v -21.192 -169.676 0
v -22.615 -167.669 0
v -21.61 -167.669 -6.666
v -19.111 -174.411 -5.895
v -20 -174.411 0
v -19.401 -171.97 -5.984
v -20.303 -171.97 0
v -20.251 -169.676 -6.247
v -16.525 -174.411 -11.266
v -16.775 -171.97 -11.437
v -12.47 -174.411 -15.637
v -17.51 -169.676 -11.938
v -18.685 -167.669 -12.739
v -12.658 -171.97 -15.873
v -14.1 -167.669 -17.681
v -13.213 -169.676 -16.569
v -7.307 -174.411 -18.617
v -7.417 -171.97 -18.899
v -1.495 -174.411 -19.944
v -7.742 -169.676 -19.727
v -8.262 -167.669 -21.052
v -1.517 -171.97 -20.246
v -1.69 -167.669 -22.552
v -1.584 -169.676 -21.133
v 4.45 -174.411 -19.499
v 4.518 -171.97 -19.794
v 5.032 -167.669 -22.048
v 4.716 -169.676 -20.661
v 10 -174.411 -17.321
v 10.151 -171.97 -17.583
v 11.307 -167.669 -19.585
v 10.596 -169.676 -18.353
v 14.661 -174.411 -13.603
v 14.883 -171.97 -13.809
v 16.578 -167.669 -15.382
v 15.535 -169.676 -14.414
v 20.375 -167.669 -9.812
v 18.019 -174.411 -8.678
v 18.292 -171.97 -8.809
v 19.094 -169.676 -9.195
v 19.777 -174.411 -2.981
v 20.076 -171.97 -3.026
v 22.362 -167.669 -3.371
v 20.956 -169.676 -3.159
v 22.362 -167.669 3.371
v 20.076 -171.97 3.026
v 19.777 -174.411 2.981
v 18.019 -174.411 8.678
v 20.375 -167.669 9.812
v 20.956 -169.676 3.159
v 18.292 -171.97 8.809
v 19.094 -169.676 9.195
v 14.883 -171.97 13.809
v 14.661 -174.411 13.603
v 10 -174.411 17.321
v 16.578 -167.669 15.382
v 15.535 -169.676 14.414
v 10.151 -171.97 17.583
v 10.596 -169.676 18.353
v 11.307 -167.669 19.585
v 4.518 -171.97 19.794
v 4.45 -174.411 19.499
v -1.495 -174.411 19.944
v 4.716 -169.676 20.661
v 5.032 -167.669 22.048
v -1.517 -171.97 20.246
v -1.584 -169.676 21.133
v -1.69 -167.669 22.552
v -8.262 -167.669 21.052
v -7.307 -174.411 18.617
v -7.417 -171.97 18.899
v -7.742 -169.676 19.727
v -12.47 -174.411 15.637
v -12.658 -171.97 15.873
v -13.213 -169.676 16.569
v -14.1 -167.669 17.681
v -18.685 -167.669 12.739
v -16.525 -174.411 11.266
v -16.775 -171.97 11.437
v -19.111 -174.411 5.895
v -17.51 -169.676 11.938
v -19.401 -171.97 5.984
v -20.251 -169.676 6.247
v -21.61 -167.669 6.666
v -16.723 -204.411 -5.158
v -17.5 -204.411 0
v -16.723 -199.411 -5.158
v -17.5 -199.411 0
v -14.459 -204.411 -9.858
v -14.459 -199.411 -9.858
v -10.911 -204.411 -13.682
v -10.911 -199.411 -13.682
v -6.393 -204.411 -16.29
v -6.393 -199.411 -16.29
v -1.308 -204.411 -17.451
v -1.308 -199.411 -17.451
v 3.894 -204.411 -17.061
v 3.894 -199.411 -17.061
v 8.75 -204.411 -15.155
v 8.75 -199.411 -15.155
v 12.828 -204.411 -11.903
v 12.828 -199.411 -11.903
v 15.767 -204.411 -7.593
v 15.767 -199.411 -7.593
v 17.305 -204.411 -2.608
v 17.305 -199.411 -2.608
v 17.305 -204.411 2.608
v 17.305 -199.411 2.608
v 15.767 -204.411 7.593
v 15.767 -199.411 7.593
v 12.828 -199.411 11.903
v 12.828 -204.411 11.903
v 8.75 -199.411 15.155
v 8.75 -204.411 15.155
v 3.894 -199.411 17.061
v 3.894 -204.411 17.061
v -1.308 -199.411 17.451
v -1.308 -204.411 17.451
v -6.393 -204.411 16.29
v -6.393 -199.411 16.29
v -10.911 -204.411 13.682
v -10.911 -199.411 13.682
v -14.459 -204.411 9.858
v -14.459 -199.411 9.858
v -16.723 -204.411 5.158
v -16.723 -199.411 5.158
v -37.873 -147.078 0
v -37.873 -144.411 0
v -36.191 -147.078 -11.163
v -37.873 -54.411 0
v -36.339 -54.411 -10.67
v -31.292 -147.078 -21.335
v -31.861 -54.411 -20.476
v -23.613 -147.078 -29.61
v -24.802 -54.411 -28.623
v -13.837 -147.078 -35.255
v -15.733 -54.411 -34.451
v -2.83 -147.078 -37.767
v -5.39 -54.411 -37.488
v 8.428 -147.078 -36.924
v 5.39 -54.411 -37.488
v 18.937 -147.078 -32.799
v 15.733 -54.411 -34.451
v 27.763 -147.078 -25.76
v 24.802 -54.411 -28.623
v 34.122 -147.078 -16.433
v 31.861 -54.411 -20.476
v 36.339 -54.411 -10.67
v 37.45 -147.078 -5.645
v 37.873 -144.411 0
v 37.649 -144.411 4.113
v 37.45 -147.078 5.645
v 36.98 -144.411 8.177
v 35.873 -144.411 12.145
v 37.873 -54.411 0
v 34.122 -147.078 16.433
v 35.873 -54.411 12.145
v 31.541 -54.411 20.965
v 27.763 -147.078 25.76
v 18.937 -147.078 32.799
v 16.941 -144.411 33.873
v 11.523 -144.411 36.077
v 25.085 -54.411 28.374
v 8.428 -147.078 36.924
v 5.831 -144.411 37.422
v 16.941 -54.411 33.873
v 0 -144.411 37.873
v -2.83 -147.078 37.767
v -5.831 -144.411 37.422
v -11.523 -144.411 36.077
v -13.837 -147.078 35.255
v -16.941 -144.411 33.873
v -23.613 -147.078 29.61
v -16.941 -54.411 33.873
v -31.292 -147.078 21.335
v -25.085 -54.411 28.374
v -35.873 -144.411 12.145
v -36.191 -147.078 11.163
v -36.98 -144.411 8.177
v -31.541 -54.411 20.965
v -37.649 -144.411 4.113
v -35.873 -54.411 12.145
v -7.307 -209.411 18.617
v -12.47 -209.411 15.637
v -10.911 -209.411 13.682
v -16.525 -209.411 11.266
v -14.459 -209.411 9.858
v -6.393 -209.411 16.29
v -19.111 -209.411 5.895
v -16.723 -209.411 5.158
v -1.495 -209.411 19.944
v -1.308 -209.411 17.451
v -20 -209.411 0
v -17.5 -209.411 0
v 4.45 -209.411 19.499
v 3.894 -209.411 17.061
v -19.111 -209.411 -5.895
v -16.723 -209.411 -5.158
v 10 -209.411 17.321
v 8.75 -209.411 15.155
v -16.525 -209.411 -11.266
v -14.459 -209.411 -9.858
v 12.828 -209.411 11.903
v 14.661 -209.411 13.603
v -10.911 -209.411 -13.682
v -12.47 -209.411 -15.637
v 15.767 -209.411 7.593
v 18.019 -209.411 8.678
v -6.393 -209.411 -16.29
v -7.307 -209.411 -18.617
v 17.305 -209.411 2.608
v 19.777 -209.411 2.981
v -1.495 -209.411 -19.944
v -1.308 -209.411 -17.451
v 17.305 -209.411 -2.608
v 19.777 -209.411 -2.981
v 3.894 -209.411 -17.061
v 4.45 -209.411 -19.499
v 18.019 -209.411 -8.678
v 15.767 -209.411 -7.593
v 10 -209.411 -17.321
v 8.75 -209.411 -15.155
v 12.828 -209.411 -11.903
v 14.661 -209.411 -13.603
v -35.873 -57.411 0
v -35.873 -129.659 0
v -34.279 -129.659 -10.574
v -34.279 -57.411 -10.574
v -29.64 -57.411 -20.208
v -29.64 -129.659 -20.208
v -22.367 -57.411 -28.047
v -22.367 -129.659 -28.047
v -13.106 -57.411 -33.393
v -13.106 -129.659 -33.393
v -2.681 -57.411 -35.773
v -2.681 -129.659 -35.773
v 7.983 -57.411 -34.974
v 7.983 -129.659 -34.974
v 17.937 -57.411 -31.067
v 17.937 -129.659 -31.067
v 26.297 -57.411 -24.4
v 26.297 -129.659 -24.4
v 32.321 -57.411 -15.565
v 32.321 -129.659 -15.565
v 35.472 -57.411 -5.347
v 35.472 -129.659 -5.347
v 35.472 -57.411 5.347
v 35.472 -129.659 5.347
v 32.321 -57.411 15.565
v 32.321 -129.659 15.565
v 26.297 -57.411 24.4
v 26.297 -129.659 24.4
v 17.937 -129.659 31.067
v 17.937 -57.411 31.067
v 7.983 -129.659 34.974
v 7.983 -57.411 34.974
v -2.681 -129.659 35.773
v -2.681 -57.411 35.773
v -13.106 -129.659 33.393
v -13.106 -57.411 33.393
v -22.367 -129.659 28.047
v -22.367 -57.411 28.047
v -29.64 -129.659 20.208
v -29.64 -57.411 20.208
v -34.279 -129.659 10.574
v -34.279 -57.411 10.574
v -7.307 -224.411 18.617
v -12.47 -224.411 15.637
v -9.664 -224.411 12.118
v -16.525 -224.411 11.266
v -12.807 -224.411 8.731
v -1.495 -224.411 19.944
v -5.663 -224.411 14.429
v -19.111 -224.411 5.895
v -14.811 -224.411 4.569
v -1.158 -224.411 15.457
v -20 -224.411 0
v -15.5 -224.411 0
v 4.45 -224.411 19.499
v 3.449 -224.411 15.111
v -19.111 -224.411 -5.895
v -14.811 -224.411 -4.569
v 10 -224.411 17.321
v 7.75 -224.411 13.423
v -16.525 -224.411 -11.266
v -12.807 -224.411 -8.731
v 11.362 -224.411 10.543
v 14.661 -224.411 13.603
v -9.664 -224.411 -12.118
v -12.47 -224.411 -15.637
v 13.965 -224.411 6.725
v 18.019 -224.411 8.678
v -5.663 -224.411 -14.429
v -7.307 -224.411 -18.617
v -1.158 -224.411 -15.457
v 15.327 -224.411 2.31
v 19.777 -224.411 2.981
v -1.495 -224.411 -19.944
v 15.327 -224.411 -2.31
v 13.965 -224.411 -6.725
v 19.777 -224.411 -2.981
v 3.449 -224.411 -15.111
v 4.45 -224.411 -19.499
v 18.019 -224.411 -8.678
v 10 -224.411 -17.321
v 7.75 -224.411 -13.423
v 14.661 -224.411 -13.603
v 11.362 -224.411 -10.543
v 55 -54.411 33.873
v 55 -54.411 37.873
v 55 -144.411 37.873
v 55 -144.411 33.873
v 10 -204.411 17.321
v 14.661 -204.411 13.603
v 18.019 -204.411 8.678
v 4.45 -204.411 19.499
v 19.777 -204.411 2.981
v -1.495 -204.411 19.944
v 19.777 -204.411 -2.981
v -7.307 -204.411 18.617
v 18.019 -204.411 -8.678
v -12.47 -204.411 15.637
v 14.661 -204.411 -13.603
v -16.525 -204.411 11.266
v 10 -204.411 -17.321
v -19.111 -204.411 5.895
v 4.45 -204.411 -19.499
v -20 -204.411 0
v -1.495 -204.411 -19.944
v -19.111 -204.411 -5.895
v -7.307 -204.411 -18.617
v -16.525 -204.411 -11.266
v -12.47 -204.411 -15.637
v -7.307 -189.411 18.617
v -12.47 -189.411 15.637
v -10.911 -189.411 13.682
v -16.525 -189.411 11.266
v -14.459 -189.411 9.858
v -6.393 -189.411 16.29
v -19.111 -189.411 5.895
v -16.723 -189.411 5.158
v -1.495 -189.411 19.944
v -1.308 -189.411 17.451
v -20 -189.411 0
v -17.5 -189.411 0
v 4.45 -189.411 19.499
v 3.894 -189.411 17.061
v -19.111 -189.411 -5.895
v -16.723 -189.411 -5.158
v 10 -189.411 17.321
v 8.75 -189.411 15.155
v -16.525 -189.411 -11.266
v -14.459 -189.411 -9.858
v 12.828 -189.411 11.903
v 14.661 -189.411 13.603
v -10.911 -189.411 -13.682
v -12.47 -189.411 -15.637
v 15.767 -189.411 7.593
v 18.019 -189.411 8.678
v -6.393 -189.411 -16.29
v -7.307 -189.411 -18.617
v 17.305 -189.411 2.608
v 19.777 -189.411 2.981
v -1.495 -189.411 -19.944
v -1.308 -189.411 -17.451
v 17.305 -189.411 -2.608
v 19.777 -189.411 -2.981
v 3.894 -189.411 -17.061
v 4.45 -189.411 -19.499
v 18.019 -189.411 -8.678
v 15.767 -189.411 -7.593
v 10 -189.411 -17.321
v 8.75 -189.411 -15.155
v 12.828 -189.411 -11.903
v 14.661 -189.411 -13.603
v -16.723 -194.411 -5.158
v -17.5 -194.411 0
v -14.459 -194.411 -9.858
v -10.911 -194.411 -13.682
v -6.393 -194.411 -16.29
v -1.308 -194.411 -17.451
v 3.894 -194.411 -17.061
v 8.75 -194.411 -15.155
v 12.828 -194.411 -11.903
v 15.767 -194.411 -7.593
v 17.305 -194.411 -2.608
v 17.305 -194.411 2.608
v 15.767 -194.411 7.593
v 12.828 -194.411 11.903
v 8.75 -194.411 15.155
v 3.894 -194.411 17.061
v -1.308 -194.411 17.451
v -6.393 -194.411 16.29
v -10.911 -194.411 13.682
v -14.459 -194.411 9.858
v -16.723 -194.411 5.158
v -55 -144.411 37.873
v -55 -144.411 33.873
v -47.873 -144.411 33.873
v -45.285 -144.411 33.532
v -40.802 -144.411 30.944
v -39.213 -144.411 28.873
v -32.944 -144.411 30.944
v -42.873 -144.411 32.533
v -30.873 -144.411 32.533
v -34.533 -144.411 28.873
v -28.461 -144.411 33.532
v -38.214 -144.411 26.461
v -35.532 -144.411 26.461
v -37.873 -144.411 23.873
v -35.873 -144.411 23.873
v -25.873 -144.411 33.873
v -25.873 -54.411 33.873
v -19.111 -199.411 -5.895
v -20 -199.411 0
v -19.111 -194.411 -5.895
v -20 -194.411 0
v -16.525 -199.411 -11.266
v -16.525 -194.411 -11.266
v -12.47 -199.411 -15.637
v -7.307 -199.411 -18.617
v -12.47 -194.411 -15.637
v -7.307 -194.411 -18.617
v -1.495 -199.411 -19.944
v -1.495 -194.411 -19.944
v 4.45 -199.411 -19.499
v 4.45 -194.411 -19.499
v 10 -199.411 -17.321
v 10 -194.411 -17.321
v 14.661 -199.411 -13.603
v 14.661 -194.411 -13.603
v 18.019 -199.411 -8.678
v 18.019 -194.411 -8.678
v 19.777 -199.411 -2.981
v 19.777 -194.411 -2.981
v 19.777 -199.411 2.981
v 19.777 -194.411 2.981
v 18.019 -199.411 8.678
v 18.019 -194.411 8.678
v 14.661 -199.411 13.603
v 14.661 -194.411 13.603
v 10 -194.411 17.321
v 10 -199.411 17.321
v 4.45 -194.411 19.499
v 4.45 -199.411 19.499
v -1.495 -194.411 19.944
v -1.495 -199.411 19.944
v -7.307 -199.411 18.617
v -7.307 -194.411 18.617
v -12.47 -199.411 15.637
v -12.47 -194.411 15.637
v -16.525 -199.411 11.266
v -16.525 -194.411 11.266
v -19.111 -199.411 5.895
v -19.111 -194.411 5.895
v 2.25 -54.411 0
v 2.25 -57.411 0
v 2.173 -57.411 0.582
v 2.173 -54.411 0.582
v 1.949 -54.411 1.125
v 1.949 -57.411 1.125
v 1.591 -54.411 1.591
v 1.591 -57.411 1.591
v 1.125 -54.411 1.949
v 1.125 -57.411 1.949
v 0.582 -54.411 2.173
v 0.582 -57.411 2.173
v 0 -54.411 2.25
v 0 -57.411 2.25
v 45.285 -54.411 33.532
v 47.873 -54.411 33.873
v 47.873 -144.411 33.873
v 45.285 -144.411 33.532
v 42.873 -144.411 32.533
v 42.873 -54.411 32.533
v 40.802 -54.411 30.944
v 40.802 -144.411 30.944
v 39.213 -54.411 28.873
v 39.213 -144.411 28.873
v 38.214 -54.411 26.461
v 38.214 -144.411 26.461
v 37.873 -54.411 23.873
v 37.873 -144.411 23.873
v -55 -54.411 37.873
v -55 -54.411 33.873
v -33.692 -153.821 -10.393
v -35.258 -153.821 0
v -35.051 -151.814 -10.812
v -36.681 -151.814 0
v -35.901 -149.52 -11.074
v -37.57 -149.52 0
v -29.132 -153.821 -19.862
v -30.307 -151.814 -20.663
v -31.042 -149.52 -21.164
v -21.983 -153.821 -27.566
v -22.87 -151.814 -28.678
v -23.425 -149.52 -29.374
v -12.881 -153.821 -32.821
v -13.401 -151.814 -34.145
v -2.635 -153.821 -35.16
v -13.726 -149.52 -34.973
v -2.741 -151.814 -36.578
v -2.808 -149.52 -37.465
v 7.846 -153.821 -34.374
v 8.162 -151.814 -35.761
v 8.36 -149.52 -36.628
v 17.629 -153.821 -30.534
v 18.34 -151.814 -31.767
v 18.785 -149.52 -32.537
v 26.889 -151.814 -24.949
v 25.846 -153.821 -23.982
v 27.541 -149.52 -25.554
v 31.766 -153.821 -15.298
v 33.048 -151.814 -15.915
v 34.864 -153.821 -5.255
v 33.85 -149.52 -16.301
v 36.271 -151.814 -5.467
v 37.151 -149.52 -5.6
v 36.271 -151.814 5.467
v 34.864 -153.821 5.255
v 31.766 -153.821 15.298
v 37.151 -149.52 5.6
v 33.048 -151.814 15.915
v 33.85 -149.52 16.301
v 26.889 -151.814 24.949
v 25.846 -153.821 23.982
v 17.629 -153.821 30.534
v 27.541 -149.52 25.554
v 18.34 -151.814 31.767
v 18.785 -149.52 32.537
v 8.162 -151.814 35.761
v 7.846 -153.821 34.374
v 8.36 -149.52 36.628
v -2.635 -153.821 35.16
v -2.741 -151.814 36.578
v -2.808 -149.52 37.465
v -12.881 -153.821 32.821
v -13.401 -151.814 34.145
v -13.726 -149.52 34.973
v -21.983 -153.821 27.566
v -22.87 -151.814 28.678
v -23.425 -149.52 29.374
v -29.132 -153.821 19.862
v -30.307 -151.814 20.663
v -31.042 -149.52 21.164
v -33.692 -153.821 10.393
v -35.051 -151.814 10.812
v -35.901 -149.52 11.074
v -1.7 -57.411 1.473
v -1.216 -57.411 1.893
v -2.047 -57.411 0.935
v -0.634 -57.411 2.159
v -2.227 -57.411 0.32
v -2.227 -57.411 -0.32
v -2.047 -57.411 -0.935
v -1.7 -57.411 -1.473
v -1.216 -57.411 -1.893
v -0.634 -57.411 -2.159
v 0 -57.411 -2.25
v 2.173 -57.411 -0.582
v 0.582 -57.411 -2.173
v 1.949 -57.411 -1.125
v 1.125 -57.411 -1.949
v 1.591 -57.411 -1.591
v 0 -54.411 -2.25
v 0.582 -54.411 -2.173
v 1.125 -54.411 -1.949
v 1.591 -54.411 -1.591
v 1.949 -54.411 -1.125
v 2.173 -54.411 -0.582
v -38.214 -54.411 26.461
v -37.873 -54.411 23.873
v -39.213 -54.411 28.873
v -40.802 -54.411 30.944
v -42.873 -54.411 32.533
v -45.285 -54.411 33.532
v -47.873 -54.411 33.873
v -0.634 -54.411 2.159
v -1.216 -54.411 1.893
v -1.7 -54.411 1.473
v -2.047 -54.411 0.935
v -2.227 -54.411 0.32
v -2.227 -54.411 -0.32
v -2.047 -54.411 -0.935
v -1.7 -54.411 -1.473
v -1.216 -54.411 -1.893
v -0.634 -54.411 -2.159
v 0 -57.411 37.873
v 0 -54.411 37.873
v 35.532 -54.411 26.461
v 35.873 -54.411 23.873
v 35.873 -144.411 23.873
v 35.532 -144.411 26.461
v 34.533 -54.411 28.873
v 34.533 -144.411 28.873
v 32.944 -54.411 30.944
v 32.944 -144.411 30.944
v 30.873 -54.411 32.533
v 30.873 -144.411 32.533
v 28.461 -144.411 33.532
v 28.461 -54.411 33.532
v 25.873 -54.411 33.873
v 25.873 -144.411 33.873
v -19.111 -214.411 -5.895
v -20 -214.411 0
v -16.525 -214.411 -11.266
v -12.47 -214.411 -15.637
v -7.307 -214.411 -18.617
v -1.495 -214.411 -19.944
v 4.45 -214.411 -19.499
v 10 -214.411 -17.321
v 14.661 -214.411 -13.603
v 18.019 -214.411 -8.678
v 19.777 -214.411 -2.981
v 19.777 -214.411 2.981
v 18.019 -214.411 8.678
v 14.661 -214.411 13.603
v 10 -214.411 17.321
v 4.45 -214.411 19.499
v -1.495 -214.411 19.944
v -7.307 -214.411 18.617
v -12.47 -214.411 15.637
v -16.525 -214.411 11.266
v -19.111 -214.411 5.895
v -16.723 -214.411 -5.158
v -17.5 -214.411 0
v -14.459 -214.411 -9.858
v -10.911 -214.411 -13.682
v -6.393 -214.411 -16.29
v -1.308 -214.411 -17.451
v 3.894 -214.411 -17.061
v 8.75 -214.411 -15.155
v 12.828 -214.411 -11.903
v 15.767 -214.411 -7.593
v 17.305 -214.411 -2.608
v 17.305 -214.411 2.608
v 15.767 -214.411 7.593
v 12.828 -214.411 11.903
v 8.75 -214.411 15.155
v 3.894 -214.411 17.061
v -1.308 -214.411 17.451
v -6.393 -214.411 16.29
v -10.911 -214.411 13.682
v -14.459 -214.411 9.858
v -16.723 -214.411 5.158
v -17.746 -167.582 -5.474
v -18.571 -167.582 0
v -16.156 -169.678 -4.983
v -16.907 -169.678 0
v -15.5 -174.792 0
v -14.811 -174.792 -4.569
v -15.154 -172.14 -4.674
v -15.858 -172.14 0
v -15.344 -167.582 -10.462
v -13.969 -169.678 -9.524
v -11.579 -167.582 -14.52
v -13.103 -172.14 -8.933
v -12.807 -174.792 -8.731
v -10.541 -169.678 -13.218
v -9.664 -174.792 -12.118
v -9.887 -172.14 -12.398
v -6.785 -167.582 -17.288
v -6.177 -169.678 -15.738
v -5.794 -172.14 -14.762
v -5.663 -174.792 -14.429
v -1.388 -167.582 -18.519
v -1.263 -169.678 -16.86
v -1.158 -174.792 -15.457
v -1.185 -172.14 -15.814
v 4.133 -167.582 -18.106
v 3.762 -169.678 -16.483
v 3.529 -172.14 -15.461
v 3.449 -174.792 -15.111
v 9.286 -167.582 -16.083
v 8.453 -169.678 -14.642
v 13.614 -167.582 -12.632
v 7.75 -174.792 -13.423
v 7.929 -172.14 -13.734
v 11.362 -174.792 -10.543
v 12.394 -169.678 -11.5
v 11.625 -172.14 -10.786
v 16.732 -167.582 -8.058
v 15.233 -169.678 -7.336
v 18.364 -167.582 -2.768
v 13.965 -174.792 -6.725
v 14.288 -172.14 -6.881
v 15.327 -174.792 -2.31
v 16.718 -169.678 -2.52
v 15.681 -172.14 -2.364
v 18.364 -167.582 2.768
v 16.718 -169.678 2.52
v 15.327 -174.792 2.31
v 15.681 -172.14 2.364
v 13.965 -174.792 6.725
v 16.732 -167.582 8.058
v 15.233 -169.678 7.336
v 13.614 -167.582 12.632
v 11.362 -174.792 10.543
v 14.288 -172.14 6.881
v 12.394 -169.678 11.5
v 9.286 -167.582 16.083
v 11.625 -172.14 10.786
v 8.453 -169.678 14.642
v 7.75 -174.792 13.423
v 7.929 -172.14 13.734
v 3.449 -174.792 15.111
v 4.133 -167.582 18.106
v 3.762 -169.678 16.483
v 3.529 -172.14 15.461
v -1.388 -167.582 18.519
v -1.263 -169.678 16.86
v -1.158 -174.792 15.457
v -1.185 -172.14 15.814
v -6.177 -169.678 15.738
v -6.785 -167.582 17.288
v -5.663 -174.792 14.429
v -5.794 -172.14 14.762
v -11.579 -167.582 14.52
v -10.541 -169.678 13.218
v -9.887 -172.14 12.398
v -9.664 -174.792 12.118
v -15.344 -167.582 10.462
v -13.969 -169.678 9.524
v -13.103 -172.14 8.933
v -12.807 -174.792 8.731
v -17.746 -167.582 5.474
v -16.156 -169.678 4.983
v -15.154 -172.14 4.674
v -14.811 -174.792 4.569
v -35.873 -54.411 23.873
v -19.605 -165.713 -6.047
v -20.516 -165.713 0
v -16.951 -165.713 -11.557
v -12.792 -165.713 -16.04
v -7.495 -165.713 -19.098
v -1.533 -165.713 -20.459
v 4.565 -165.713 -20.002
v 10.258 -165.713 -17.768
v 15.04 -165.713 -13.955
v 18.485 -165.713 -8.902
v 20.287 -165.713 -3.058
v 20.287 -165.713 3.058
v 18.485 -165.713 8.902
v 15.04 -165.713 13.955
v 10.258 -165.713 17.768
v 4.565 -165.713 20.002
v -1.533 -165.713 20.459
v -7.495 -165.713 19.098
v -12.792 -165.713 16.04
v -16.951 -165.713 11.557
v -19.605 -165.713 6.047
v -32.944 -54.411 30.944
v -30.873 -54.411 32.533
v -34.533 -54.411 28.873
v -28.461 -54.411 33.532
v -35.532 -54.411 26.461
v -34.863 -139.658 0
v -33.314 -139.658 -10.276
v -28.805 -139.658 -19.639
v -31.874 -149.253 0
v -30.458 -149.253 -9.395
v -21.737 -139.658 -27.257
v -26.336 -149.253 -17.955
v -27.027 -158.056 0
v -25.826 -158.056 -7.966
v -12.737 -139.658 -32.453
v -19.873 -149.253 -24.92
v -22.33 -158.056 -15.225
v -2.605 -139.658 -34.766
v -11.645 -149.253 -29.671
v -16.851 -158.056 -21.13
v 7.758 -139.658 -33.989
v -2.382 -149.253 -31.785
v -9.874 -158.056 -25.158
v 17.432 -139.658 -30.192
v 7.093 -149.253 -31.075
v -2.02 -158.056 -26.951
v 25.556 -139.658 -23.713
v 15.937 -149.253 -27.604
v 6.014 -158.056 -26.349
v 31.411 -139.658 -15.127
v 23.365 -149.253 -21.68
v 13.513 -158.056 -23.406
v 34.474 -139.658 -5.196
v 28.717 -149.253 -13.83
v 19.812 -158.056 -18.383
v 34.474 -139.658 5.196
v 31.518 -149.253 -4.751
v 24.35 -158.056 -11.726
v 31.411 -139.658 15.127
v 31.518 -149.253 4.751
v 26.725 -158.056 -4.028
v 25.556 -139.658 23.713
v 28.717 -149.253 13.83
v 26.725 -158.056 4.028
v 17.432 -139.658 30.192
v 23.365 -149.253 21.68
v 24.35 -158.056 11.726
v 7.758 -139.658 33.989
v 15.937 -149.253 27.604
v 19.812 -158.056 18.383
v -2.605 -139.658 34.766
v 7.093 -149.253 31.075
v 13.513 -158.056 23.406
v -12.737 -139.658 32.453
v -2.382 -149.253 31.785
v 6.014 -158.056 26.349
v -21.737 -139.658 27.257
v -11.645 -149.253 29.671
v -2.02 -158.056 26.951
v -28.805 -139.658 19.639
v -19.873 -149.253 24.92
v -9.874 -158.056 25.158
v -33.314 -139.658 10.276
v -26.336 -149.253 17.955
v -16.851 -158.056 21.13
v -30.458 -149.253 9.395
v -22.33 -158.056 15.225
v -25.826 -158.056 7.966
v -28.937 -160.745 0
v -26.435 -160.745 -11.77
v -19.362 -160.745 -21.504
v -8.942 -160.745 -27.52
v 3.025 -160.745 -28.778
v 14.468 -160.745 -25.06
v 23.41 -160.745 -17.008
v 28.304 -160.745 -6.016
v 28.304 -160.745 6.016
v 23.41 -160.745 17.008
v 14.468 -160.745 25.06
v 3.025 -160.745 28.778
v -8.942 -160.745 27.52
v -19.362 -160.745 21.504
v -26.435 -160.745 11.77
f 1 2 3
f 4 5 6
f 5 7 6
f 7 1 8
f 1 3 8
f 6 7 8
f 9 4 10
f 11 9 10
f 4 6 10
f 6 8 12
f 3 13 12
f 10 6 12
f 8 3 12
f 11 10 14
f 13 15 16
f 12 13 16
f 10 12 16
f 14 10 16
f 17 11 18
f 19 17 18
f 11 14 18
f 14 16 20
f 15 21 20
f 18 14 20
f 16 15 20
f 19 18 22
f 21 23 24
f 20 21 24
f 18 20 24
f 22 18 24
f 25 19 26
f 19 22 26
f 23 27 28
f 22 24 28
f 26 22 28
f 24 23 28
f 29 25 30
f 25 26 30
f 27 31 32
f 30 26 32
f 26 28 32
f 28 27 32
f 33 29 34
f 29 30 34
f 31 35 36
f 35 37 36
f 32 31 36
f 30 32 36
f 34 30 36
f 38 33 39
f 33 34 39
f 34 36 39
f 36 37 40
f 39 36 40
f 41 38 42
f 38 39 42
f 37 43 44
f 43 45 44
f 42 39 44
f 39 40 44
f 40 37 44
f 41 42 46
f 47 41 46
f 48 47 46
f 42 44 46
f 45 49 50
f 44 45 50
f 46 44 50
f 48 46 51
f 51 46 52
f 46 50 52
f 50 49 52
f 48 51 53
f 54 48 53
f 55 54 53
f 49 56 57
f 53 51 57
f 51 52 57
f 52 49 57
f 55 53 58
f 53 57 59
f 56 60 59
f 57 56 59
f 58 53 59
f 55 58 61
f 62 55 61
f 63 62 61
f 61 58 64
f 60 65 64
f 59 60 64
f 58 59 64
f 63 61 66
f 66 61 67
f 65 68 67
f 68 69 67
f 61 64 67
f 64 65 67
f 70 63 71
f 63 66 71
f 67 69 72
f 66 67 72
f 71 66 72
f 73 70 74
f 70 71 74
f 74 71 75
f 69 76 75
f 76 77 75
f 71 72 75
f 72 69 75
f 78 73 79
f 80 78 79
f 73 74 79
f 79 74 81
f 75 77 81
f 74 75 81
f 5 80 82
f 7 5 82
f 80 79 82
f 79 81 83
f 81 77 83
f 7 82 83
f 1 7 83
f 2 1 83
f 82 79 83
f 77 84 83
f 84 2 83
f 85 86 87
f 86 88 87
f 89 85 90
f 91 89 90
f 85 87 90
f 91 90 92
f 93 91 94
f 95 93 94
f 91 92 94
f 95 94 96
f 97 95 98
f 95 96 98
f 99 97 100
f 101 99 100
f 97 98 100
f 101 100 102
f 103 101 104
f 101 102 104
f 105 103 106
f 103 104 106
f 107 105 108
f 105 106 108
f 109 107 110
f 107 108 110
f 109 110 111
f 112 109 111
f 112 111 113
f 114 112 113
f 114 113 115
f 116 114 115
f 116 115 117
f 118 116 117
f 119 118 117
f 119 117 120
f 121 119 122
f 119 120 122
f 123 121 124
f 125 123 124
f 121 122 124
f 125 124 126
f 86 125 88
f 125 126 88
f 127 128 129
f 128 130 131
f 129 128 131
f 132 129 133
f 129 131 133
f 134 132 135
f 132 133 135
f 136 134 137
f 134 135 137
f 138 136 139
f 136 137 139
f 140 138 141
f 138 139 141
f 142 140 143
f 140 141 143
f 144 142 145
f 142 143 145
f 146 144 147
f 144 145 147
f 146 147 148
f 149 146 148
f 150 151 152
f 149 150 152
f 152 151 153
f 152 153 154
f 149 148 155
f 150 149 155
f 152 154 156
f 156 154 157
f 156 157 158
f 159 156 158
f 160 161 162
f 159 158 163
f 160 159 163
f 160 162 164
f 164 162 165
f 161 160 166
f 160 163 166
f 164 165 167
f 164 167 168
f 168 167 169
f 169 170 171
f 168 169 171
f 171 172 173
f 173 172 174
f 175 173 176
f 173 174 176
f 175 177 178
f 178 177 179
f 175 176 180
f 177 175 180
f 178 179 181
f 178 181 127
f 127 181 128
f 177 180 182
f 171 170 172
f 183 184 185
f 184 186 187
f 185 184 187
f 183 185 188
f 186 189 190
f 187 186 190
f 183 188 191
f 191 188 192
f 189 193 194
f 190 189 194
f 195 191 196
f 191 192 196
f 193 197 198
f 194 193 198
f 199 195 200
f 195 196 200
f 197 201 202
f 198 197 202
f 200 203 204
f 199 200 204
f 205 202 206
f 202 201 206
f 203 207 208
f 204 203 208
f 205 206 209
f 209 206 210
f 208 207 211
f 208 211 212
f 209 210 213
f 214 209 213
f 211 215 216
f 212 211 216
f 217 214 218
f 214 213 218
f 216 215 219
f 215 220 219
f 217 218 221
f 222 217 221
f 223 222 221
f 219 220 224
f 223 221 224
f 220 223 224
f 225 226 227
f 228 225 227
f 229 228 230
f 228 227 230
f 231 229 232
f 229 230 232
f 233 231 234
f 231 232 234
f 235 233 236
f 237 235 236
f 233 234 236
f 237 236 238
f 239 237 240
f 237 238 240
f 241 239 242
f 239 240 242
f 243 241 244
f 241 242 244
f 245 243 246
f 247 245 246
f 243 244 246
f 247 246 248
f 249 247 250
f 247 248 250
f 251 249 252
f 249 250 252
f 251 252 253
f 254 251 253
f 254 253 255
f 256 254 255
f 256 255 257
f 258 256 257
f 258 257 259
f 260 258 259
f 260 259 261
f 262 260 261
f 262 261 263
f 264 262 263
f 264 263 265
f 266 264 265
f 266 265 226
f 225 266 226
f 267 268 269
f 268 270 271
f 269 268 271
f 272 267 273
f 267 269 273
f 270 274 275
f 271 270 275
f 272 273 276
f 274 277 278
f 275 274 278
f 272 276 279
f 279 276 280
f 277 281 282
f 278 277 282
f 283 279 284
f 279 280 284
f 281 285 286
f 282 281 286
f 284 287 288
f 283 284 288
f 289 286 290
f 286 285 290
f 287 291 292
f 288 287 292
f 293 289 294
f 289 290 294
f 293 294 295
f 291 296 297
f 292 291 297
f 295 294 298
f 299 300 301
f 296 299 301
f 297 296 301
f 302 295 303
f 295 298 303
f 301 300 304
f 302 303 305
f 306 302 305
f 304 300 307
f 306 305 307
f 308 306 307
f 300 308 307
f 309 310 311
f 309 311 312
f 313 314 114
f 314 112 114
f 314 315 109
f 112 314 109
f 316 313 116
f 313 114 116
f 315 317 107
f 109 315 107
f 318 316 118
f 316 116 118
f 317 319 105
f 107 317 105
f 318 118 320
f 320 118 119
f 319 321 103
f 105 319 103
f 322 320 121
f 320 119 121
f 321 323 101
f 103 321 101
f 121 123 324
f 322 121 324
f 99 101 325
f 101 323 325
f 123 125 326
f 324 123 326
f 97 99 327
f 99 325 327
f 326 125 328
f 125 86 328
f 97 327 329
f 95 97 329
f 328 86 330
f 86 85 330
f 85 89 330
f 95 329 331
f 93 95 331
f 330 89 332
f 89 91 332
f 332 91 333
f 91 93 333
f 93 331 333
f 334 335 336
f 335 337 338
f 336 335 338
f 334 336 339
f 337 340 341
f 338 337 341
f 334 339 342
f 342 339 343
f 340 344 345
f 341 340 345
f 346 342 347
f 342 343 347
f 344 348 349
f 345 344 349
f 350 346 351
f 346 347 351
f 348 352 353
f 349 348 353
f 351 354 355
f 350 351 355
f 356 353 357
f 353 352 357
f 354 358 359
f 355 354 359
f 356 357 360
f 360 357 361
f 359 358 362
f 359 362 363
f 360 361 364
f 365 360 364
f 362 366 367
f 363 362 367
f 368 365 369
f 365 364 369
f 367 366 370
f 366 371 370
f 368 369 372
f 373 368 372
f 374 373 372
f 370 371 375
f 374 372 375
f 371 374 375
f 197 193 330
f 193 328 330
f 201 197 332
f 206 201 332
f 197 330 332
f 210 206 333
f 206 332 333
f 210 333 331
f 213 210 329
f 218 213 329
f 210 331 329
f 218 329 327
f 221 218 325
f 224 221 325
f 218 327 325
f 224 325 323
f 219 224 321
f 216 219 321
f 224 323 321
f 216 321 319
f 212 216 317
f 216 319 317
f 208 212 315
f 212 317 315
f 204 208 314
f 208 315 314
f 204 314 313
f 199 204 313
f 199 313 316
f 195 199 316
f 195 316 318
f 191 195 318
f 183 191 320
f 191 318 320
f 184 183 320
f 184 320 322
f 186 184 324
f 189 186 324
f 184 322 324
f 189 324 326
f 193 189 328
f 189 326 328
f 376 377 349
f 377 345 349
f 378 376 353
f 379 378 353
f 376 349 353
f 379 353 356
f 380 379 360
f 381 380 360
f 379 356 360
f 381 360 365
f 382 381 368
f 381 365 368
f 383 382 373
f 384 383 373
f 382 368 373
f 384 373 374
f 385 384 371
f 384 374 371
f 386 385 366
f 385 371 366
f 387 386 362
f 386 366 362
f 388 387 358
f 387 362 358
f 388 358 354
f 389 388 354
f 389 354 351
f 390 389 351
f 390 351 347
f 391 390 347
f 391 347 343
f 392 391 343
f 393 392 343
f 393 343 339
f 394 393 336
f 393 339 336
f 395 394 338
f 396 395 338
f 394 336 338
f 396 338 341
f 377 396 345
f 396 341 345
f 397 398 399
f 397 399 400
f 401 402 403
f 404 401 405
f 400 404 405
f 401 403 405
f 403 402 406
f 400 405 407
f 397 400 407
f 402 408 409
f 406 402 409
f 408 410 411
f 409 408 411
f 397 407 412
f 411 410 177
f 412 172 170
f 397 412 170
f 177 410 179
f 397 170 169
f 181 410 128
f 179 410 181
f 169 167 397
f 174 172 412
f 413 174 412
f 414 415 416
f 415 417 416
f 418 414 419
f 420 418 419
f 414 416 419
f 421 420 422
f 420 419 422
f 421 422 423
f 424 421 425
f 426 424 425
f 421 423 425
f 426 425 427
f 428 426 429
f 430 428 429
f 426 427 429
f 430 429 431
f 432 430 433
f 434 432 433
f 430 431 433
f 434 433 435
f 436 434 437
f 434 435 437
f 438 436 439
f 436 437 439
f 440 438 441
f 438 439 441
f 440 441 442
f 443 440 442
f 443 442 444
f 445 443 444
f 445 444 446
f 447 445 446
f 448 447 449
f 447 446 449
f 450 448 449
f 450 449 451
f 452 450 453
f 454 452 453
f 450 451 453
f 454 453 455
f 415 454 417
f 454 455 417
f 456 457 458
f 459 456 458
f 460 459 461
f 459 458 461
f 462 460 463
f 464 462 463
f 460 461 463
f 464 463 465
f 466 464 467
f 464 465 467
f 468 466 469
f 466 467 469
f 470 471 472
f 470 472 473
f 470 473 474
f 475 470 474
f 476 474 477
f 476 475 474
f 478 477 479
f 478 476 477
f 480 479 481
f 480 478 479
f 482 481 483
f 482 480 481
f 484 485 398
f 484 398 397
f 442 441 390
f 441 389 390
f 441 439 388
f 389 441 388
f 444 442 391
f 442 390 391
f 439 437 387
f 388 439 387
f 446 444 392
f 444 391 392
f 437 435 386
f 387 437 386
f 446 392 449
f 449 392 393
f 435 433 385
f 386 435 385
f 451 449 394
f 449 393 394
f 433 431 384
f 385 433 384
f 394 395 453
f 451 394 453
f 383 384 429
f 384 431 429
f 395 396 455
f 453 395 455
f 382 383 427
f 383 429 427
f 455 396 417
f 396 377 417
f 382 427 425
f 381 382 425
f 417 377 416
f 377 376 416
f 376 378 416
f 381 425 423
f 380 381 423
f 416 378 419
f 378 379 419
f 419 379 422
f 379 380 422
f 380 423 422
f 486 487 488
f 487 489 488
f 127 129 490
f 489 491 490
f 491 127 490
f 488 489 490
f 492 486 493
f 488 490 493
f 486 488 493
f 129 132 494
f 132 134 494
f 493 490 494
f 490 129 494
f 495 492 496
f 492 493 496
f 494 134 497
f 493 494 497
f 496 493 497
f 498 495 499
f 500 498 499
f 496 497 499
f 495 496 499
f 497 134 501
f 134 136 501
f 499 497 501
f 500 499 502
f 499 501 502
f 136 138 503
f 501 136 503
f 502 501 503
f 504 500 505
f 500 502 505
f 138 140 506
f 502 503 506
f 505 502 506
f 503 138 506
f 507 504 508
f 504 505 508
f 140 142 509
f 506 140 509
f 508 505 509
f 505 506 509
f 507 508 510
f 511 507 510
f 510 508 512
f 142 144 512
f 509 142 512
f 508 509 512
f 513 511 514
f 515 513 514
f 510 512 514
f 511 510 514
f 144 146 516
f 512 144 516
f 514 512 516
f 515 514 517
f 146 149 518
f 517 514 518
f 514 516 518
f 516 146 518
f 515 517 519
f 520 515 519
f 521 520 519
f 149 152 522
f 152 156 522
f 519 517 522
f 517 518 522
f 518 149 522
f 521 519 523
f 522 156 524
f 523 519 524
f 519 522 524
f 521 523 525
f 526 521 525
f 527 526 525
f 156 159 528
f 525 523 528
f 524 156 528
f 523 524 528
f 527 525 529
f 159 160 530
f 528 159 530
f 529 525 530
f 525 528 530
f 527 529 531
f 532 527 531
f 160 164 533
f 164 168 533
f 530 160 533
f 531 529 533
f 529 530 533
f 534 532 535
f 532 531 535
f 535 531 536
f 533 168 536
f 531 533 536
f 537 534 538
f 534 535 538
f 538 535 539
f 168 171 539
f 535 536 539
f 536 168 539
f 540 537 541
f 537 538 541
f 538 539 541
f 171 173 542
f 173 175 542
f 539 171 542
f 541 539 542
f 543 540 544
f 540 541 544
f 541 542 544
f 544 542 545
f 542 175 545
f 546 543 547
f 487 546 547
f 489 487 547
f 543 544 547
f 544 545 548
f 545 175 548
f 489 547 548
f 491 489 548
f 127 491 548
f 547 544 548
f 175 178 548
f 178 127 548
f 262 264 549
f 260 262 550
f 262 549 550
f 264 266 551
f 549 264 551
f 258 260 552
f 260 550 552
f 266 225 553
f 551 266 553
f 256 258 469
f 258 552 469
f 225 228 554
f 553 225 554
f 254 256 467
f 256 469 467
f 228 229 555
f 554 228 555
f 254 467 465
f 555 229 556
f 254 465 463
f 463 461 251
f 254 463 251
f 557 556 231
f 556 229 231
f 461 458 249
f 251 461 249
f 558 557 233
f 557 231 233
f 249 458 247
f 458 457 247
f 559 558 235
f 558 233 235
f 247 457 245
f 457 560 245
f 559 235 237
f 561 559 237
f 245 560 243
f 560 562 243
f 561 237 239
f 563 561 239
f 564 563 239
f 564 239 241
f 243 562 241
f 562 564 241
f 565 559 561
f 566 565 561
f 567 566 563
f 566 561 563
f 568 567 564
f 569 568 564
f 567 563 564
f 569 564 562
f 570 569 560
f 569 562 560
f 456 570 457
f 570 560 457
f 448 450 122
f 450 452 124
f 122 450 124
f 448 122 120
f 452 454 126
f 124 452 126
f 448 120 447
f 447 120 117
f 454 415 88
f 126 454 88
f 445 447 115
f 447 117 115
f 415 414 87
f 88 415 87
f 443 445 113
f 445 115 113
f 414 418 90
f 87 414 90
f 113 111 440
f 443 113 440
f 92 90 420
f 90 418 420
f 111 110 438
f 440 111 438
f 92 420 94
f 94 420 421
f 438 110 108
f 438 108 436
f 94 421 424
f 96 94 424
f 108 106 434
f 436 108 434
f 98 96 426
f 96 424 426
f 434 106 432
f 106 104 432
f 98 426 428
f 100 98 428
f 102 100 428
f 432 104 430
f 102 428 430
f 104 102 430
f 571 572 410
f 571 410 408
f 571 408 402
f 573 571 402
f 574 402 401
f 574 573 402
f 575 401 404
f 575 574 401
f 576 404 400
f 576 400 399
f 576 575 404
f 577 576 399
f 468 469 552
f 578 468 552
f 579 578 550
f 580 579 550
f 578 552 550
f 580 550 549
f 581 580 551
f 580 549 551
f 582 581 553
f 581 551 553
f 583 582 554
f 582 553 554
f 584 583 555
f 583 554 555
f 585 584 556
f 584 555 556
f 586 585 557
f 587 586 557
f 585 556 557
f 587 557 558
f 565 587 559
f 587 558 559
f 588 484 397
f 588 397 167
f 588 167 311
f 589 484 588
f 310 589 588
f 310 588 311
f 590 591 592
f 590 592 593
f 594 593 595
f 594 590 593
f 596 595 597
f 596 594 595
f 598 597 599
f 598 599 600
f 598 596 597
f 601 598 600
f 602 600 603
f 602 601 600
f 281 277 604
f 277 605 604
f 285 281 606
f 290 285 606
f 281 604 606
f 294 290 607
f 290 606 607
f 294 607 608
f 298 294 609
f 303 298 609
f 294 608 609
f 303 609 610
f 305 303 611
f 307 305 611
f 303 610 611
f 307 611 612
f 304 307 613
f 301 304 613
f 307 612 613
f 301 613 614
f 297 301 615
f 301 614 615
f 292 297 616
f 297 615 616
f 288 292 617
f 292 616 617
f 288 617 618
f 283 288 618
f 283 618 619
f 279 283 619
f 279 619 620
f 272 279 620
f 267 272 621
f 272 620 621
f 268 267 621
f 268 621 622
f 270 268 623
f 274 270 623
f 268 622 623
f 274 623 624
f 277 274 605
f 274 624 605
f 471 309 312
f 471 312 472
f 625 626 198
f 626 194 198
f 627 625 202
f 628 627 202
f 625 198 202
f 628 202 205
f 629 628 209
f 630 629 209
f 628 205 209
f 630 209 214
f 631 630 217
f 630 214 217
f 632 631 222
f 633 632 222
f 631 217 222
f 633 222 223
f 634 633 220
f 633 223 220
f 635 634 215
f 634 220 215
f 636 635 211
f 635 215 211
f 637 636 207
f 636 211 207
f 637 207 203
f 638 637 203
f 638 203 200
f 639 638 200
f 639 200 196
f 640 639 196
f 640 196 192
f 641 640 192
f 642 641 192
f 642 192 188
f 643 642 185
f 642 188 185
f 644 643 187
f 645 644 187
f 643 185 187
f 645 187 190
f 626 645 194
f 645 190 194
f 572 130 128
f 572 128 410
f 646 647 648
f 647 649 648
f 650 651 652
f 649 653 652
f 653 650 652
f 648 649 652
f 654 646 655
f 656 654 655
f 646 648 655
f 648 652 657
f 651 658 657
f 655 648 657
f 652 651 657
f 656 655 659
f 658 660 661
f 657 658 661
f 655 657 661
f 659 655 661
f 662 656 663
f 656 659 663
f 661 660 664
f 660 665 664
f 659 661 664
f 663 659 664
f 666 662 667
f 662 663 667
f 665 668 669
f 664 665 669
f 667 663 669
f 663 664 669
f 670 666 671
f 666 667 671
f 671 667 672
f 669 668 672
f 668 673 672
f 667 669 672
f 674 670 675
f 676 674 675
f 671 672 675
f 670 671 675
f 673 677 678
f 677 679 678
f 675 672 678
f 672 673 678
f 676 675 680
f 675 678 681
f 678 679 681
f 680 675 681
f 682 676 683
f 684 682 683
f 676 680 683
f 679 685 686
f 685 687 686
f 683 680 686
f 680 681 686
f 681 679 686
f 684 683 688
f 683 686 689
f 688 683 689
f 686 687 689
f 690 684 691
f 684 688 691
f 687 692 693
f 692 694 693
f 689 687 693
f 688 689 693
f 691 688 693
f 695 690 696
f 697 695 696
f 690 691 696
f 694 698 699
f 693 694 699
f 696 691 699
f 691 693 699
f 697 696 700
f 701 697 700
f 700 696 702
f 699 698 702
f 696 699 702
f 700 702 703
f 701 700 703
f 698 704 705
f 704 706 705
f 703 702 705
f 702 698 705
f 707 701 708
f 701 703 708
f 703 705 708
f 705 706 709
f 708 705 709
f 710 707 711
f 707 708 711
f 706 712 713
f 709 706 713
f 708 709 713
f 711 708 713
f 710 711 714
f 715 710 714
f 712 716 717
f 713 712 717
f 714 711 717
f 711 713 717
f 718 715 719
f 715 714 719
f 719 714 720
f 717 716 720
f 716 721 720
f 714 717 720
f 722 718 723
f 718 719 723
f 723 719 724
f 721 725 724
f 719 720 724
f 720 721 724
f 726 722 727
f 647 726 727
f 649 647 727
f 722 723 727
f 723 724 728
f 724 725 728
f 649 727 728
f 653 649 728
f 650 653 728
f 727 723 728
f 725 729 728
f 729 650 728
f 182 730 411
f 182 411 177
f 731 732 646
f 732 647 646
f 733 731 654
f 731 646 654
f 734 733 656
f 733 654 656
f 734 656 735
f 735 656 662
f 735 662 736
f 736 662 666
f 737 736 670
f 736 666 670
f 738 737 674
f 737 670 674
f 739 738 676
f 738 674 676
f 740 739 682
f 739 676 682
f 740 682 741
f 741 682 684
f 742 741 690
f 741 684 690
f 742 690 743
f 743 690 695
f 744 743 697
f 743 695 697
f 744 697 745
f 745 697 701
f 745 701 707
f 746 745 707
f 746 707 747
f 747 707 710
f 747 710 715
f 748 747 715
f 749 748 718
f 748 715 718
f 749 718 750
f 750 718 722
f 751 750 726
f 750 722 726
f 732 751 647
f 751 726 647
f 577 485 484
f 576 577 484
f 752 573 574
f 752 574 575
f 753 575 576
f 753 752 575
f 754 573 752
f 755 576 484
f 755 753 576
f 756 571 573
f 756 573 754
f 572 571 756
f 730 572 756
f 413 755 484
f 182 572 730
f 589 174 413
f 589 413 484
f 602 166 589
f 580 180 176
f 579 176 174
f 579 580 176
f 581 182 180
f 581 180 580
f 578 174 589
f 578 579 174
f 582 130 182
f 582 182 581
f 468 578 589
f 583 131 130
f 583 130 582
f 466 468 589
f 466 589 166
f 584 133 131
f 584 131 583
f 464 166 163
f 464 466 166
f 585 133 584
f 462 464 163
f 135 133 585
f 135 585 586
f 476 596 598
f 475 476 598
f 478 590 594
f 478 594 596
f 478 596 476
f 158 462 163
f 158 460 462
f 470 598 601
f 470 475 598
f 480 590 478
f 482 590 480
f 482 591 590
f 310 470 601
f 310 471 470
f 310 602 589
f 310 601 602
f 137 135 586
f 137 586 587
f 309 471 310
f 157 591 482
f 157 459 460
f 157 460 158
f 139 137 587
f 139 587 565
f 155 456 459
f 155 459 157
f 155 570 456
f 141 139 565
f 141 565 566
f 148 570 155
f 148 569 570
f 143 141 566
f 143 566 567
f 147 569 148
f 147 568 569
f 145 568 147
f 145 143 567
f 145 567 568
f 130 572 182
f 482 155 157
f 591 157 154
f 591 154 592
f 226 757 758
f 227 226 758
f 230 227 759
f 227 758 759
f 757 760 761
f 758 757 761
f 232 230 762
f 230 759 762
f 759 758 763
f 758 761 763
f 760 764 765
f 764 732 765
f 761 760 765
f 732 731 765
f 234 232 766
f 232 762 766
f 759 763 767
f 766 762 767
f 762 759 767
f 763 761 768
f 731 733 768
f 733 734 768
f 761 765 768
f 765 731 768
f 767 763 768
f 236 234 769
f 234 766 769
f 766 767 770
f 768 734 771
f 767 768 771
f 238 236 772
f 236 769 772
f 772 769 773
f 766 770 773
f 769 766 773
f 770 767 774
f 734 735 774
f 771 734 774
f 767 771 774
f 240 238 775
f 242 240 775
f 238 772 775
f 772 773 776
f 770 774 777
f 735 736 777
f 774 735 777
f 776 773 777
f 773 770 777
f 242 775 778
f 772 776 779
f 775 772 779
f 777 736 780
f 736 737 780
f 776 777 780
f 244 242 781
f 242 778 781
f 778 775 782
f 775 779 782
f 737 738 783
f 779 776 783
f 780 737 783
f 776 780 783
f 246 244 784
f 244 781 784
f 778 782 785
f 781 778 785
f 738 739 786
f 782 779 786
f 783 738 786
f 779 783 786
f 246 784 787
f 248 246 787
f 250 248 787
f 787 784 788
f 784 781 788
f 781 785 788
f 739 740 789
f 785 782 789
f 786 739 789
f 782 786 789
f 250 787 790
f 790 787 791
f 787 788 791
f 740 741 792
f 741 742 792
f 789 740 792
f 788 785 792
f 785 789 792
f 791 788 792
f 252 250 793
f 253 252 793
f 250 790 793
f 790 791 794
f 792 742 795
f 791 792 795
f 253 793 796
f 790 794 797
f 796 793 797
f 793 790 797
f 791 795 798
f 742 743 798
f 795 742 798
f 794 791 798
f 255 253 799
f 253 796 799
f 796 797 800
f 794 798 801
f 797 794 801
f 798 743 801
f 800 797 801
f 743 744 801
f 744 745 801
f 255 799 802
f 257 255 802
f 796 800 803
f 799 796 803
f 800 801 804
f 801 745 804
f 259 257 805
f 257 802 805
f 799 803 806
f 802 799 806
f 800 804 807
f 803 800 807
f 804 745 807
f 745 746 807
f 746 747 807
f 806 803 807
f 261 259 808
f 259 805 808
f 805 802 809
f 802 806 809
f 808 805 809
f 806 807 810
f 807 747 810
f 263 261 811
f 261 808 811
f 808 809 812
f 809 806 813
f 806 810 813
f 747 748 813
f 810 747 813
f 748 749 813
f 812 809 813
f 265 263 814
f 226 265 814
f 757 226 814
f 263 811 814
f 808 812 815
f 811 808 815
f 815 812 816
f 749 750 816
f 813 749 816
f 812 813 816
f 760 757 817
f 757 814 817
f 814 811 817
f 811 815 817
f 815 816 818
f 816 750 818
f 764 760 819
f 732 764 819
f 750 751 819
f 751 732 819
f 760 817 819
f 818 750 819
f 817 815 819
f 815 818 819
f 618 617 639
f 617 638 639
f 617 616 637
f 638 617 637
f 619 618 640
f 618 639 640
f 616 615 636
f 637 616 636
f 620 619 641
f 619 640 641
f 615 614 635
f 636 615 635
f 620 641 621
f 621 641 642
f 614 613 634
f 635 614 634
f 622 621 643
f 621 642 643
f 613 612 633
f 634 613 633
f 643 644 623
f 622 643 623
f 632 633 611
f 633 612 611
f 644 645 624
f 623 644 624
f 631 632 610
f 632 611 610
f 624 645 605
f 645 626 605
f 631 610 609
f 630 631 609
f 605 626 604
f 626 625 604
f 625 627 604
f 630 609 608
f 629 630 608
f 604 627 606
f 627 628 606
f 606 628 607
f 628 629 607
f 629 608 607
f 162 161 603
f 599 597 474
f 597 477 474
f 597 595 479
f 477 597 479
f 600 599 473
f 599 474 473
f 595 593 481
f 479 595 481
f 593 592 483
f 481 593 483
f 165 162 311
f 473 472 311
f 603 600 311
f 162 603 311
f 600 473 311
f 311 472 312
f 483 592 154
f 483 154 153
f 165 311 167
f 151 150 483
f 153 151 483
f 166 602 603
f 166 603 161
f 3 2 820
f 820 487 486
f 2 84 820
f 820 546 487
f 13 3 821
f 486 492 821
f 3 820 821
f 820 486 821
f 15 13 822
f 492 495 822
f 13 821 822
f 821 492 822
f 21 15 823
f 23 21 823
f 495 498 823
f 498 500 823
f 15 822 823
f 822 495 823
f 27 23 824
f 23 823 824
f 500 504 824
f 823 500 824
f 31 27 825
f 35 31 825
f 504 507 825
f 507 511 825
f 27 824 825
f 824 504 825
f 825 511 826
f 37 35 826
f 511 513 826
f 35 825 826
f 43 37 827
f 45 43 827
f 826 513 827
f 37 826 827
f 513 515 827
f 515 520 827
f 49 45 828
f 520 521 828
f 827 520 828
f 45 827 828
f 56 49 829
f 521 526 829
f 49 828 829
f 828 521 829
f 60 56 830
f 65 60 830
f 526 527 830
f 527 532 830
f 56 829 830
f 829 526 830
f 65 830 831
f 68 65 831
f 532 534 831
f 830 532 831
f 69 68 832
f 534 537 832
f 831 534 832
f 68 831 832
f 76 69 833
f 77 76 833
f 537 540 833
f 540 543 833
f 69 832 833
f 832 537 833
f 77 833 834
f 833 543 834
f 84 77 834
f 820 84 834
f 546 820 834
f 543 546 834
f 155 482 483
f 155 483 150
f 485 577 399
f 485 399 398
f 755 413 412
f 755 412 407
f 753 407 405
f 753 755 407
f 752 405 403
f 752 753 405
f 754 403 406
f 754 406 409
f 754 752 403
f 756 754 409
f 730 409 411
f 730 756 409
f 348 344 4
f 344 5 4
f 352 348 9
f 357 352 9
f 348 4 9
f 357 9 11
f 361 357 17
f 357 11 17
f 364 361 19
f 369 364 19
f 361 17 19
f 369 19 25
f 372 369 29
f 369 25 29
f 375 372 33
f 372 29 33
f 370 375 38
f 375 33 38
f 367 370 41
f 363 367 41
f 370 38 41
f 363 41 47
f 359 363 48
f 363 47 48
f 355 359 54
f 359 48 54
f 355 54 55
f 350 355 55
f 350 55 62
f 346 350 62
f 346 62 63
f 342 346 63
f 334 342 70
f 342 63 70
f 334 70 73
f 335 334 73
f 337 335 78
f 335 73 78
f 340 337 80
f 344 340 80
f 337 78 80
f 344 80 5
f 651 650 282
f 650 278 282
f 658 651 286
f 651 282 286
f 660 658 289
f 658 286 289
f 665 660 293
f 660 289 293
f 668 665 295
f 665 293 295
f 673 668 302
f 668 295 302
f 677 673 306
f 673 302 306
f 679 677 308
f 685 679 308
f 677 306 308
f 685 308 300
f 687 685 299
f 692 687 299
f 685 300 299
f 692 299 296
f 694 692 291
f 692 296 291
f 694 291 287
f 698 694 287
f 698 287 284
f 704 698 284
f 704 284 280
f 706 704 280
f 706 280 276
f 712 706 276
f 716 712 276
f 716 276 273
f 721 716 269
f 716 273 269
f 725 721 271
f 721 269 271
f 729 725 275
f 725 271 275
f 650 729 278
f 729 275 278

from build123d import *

# Parameters (mm, degrees)
EXTRUDE_1_DEPTH = 90
EXTRUDE_START   = -3
EXTRUDE_2_DEPTH = 3


with BuildPart() as part:
    # 草图2 → 旋转1 (revolve)
    with BuildSketch(Plane.XY, mode=Mode.PRIVATE) as revolve_1_sk:
        with BuildLine():
            Line((20, -224.411230387), (20, -214.411230387))
            Line((20, -214.411230387), (17.5, -214.411230387))
            Line((17.5, -214.411230387), (17.5, -209.411230387))
            Line((17.5, -209.411230387), (20, -209.411230387))
            Line((20, -209.411230387), (20, -204.411230387))
            Line((20, -204.411230387), (17.5, -204.411230387))
            Line((17.5, -204.411230387), (17.5, -199.411230387))
            Line((17.5, -199.411230387), (20, -199.411230387))
            Line((20, -199.411230387), (20, -194.411230387))
            Line((20, -194.411230387), (17.5, -194.411230387))
            Line((17.5, -194.411230387), (17.5, -189.411230387))
            Line((17.5, -189.411230387), (20, -189.411230387))
            Line((20, -189.411230387), (20, -174.411230387))
            ThreePointArc((20, -174.411230387), (20.676631798, -170.795320354), (22.614961073, -167.668738262))
            Line((22.614961073, -167.668738262), (35.258140309, -153.820687856))
            ThreePointArc((35.258140309, -153.820687856), (37.196469585, -150.694105764), (37.873101383, -147.078195731))
            Line((37.873101383, -147.078195731), (37.873101383, -54.411230387))
            Line((37.873101383, -54.411230387), (35.873101383, -54.411230387))
            Line((35.873101383, -54.411230387), (35.873101383, -129.659355933))
            ThreePointArc((35.873101383, -129.659355933), (31.874010536, -149.253139566), (20.5164471, -165.712630368))
            Line((20.5164471, -165.712630368), (18.571330856, -167.581679311))
            ThreePointArc((18.571330856, -167.581679311), (16.299818169, -170.873577472), (15.5, -174.792334198))
            Line((15.5, -174.792334198), (15.5, -224.411230387))
            Line((15.5, -224.411230387), (20, -224.411230387))
        make_face()
    revolve(revolve_1_sk.sketch.rotate(Axis((0, -59.896764436, 0), (0, -1, 0)), 180), axis=Axis((0, -59.896764436, 0), (0, -1, 0)))

    # 草图4 → 凸台-拉伸1 (add)
    with BuildSketch(Plane(origin=(0, -54.411230387, 0), x_dir=(1, 0, 0), z_dir=(0, 1, 0))):
        with BuildLine():
            ThreePointArc((-35.873101383, -12.144645138), (-37.369756581, -6.154112558), (-37.873101383, 0))
            Line((-37.873101383, 0), (-37.873101383, -23.873101383))
            ThreePointArc((-37.873101383, -23.873101383), (-40.802033571, -30.944169195), (-47.873101383, -33.873101383))
            Line((-47.873101383, -33.873101383), (-55, -33.873101383))
            Line((-55, -33.873101383), (-55, -37.873101383))
            Line((-55, -37.873101383), (0, -37.873101383))
            ThreePointArc((0, -37.873101383), (-8.703229445, -36.859538868), (-16.940626053, -33.873101383))
            Line((-16.940626053, -33.873101383), (-25.873101383, -33.873101383))
            ThreePointArc((-25.873101383, -33.873101383), (-32.944169195, -30.944169195), (-35.873101383, -23.873101383))
            Line((-35.873101383, -23.873101383), (-35.873101383, -12.144645138))
        make_face()
        with BuildLine():
            Line((37.873101383, -23.873101383), (37.873101383, 0))
            ThreePointArc((37.873101383, 0), (37.369756581, -6.154112558), (35.873101383, -12.144645138))
            Line((35.873101383, -12.144645138), (35.873101383, -23.873101383))
            ThreePointArc((35.873101383, -23.873101383), (32.944169195, -30.944169195), (25.873101383, -33.873101383))
            Line((25.873101383, -33.873101383), (16.940626053, -33.873101383))
            ThreePointArc((16.940626053, -33.873101383), (8.703229445, -36.859538868), (0, -37.873101383))
            Line((0, -37.873101383), (55, -37.873101383))
            Line((55, -37.873101383), (55, -33.873101383))
            Line((55, -33.873101383), (47.873101383, -33.873101383))
            ThreePointArc((47.873101383, -33.873101383), (40.802033571, -30.944169195), (37.873101383, -23.873101383))
        make_face()
        with BuildLine():
            ThreePointArc((0, -35.873101383), (-5.98941578, -35.369567448), (-11.810690307, -33.873101383))
            Line((-11.810690307, -33.873101383), (-16.940626053, -33.873101383))
            ThreePointArc((-16.940626053, -33.873101383), (-8.703229445, -36.859538868), (0, -37.873101383))
            Line((0, -37.873101383), (0, -35.873101383))
        make_face()
        with BuildLine():
            Line((16.940626053, -33.873101383), (11.810690307, -33.873101383))
            ThreePointArc((11.810690307, -33.873101383), (5.98941578, -35.369567448), (0, -35.873101383))
            Line((0, -35.873101383), (0, -37.873101383))
            ThreePointArc((0, -37.873101383), (8.703229445, -36.859538868), (16.940626053, -33.873101383))
        make_face()
    extrude(amount=-EXTRUDE_1_DEPTH)

    # 草图3 → 凸台-拉伸2 (add)
    with BuildSketch(Plane(origin=(0, -54.411230387, 0), x_dir=(1, 0, 0), z_dir=(0, 1, 0)).offset(EXTRUDE_START)):
        with BuildLine():
            ThreePointArc((35.873101383, 0), (25.36611325, 25.36611325), (0, 35.873101383))
            Line((0, 35.873101383), (0, 2.25))
            ThreePointArc((0, 2.25), (1.590990258, 1.590990258), (2.25, 0))
            ThreePointArc((2.25, 0), (1.590990258, -1.590990258), (0, -2.25))
            Line((0, -2.25), (0, -35.873101383))
            ThreePointArc((0, -35.873101383), (25.36611325, -25.36611325), (35.873101383, 0))
        make_face()
        with BuildLine():
            Line((0, 2.25), (0, 35.873101383))
            ThreePointArc((0, 35.873101383), (-35.873101383, 0), (0, -35.873101383))
            Line((0, -35.873101383), (0, -2.25))
            ThreePointArc((0, -2.25), (-2.25, 0), (0, 2.25))
        make_face()
        with BuildLine():
            ThreePointArc((37.873101383, 0), (26.780326812, 26.780326812), (0, 37.873101383))
            Line((0, 37.873101383), (0, 35.873101383))
            ThreePointArc((0, 35.873101383), (25.36611325, 25.36611325), (35.873101383, 0))
            ThreePointArc((35.873101383, 0), (25.36611325, -25.36611325), (0, -35.873101383))
            Line((0, -35.873101383), (0, -37.873101383))
            ThreePointArc((0, -37.873101383), (26.780326812, -26.780326812), (37.873101383, 0))
        make_face()
        with BuildLine():
            Line((0, 35.873101383), (0, 37.873101383))
            ThreePointArc((0, 37.873101383), (-37.873101383, 0), (0, -37.873101383))
            Line((0, -37.873101383), (0, -35.873101383))
            ThreePointArc((0, -35.873101383), (-35.873101383, 0), (0, 35.873101383))
        make_face()
    extrude(amount=EXTRUDE_2_DEPTH)


solid = part.part
